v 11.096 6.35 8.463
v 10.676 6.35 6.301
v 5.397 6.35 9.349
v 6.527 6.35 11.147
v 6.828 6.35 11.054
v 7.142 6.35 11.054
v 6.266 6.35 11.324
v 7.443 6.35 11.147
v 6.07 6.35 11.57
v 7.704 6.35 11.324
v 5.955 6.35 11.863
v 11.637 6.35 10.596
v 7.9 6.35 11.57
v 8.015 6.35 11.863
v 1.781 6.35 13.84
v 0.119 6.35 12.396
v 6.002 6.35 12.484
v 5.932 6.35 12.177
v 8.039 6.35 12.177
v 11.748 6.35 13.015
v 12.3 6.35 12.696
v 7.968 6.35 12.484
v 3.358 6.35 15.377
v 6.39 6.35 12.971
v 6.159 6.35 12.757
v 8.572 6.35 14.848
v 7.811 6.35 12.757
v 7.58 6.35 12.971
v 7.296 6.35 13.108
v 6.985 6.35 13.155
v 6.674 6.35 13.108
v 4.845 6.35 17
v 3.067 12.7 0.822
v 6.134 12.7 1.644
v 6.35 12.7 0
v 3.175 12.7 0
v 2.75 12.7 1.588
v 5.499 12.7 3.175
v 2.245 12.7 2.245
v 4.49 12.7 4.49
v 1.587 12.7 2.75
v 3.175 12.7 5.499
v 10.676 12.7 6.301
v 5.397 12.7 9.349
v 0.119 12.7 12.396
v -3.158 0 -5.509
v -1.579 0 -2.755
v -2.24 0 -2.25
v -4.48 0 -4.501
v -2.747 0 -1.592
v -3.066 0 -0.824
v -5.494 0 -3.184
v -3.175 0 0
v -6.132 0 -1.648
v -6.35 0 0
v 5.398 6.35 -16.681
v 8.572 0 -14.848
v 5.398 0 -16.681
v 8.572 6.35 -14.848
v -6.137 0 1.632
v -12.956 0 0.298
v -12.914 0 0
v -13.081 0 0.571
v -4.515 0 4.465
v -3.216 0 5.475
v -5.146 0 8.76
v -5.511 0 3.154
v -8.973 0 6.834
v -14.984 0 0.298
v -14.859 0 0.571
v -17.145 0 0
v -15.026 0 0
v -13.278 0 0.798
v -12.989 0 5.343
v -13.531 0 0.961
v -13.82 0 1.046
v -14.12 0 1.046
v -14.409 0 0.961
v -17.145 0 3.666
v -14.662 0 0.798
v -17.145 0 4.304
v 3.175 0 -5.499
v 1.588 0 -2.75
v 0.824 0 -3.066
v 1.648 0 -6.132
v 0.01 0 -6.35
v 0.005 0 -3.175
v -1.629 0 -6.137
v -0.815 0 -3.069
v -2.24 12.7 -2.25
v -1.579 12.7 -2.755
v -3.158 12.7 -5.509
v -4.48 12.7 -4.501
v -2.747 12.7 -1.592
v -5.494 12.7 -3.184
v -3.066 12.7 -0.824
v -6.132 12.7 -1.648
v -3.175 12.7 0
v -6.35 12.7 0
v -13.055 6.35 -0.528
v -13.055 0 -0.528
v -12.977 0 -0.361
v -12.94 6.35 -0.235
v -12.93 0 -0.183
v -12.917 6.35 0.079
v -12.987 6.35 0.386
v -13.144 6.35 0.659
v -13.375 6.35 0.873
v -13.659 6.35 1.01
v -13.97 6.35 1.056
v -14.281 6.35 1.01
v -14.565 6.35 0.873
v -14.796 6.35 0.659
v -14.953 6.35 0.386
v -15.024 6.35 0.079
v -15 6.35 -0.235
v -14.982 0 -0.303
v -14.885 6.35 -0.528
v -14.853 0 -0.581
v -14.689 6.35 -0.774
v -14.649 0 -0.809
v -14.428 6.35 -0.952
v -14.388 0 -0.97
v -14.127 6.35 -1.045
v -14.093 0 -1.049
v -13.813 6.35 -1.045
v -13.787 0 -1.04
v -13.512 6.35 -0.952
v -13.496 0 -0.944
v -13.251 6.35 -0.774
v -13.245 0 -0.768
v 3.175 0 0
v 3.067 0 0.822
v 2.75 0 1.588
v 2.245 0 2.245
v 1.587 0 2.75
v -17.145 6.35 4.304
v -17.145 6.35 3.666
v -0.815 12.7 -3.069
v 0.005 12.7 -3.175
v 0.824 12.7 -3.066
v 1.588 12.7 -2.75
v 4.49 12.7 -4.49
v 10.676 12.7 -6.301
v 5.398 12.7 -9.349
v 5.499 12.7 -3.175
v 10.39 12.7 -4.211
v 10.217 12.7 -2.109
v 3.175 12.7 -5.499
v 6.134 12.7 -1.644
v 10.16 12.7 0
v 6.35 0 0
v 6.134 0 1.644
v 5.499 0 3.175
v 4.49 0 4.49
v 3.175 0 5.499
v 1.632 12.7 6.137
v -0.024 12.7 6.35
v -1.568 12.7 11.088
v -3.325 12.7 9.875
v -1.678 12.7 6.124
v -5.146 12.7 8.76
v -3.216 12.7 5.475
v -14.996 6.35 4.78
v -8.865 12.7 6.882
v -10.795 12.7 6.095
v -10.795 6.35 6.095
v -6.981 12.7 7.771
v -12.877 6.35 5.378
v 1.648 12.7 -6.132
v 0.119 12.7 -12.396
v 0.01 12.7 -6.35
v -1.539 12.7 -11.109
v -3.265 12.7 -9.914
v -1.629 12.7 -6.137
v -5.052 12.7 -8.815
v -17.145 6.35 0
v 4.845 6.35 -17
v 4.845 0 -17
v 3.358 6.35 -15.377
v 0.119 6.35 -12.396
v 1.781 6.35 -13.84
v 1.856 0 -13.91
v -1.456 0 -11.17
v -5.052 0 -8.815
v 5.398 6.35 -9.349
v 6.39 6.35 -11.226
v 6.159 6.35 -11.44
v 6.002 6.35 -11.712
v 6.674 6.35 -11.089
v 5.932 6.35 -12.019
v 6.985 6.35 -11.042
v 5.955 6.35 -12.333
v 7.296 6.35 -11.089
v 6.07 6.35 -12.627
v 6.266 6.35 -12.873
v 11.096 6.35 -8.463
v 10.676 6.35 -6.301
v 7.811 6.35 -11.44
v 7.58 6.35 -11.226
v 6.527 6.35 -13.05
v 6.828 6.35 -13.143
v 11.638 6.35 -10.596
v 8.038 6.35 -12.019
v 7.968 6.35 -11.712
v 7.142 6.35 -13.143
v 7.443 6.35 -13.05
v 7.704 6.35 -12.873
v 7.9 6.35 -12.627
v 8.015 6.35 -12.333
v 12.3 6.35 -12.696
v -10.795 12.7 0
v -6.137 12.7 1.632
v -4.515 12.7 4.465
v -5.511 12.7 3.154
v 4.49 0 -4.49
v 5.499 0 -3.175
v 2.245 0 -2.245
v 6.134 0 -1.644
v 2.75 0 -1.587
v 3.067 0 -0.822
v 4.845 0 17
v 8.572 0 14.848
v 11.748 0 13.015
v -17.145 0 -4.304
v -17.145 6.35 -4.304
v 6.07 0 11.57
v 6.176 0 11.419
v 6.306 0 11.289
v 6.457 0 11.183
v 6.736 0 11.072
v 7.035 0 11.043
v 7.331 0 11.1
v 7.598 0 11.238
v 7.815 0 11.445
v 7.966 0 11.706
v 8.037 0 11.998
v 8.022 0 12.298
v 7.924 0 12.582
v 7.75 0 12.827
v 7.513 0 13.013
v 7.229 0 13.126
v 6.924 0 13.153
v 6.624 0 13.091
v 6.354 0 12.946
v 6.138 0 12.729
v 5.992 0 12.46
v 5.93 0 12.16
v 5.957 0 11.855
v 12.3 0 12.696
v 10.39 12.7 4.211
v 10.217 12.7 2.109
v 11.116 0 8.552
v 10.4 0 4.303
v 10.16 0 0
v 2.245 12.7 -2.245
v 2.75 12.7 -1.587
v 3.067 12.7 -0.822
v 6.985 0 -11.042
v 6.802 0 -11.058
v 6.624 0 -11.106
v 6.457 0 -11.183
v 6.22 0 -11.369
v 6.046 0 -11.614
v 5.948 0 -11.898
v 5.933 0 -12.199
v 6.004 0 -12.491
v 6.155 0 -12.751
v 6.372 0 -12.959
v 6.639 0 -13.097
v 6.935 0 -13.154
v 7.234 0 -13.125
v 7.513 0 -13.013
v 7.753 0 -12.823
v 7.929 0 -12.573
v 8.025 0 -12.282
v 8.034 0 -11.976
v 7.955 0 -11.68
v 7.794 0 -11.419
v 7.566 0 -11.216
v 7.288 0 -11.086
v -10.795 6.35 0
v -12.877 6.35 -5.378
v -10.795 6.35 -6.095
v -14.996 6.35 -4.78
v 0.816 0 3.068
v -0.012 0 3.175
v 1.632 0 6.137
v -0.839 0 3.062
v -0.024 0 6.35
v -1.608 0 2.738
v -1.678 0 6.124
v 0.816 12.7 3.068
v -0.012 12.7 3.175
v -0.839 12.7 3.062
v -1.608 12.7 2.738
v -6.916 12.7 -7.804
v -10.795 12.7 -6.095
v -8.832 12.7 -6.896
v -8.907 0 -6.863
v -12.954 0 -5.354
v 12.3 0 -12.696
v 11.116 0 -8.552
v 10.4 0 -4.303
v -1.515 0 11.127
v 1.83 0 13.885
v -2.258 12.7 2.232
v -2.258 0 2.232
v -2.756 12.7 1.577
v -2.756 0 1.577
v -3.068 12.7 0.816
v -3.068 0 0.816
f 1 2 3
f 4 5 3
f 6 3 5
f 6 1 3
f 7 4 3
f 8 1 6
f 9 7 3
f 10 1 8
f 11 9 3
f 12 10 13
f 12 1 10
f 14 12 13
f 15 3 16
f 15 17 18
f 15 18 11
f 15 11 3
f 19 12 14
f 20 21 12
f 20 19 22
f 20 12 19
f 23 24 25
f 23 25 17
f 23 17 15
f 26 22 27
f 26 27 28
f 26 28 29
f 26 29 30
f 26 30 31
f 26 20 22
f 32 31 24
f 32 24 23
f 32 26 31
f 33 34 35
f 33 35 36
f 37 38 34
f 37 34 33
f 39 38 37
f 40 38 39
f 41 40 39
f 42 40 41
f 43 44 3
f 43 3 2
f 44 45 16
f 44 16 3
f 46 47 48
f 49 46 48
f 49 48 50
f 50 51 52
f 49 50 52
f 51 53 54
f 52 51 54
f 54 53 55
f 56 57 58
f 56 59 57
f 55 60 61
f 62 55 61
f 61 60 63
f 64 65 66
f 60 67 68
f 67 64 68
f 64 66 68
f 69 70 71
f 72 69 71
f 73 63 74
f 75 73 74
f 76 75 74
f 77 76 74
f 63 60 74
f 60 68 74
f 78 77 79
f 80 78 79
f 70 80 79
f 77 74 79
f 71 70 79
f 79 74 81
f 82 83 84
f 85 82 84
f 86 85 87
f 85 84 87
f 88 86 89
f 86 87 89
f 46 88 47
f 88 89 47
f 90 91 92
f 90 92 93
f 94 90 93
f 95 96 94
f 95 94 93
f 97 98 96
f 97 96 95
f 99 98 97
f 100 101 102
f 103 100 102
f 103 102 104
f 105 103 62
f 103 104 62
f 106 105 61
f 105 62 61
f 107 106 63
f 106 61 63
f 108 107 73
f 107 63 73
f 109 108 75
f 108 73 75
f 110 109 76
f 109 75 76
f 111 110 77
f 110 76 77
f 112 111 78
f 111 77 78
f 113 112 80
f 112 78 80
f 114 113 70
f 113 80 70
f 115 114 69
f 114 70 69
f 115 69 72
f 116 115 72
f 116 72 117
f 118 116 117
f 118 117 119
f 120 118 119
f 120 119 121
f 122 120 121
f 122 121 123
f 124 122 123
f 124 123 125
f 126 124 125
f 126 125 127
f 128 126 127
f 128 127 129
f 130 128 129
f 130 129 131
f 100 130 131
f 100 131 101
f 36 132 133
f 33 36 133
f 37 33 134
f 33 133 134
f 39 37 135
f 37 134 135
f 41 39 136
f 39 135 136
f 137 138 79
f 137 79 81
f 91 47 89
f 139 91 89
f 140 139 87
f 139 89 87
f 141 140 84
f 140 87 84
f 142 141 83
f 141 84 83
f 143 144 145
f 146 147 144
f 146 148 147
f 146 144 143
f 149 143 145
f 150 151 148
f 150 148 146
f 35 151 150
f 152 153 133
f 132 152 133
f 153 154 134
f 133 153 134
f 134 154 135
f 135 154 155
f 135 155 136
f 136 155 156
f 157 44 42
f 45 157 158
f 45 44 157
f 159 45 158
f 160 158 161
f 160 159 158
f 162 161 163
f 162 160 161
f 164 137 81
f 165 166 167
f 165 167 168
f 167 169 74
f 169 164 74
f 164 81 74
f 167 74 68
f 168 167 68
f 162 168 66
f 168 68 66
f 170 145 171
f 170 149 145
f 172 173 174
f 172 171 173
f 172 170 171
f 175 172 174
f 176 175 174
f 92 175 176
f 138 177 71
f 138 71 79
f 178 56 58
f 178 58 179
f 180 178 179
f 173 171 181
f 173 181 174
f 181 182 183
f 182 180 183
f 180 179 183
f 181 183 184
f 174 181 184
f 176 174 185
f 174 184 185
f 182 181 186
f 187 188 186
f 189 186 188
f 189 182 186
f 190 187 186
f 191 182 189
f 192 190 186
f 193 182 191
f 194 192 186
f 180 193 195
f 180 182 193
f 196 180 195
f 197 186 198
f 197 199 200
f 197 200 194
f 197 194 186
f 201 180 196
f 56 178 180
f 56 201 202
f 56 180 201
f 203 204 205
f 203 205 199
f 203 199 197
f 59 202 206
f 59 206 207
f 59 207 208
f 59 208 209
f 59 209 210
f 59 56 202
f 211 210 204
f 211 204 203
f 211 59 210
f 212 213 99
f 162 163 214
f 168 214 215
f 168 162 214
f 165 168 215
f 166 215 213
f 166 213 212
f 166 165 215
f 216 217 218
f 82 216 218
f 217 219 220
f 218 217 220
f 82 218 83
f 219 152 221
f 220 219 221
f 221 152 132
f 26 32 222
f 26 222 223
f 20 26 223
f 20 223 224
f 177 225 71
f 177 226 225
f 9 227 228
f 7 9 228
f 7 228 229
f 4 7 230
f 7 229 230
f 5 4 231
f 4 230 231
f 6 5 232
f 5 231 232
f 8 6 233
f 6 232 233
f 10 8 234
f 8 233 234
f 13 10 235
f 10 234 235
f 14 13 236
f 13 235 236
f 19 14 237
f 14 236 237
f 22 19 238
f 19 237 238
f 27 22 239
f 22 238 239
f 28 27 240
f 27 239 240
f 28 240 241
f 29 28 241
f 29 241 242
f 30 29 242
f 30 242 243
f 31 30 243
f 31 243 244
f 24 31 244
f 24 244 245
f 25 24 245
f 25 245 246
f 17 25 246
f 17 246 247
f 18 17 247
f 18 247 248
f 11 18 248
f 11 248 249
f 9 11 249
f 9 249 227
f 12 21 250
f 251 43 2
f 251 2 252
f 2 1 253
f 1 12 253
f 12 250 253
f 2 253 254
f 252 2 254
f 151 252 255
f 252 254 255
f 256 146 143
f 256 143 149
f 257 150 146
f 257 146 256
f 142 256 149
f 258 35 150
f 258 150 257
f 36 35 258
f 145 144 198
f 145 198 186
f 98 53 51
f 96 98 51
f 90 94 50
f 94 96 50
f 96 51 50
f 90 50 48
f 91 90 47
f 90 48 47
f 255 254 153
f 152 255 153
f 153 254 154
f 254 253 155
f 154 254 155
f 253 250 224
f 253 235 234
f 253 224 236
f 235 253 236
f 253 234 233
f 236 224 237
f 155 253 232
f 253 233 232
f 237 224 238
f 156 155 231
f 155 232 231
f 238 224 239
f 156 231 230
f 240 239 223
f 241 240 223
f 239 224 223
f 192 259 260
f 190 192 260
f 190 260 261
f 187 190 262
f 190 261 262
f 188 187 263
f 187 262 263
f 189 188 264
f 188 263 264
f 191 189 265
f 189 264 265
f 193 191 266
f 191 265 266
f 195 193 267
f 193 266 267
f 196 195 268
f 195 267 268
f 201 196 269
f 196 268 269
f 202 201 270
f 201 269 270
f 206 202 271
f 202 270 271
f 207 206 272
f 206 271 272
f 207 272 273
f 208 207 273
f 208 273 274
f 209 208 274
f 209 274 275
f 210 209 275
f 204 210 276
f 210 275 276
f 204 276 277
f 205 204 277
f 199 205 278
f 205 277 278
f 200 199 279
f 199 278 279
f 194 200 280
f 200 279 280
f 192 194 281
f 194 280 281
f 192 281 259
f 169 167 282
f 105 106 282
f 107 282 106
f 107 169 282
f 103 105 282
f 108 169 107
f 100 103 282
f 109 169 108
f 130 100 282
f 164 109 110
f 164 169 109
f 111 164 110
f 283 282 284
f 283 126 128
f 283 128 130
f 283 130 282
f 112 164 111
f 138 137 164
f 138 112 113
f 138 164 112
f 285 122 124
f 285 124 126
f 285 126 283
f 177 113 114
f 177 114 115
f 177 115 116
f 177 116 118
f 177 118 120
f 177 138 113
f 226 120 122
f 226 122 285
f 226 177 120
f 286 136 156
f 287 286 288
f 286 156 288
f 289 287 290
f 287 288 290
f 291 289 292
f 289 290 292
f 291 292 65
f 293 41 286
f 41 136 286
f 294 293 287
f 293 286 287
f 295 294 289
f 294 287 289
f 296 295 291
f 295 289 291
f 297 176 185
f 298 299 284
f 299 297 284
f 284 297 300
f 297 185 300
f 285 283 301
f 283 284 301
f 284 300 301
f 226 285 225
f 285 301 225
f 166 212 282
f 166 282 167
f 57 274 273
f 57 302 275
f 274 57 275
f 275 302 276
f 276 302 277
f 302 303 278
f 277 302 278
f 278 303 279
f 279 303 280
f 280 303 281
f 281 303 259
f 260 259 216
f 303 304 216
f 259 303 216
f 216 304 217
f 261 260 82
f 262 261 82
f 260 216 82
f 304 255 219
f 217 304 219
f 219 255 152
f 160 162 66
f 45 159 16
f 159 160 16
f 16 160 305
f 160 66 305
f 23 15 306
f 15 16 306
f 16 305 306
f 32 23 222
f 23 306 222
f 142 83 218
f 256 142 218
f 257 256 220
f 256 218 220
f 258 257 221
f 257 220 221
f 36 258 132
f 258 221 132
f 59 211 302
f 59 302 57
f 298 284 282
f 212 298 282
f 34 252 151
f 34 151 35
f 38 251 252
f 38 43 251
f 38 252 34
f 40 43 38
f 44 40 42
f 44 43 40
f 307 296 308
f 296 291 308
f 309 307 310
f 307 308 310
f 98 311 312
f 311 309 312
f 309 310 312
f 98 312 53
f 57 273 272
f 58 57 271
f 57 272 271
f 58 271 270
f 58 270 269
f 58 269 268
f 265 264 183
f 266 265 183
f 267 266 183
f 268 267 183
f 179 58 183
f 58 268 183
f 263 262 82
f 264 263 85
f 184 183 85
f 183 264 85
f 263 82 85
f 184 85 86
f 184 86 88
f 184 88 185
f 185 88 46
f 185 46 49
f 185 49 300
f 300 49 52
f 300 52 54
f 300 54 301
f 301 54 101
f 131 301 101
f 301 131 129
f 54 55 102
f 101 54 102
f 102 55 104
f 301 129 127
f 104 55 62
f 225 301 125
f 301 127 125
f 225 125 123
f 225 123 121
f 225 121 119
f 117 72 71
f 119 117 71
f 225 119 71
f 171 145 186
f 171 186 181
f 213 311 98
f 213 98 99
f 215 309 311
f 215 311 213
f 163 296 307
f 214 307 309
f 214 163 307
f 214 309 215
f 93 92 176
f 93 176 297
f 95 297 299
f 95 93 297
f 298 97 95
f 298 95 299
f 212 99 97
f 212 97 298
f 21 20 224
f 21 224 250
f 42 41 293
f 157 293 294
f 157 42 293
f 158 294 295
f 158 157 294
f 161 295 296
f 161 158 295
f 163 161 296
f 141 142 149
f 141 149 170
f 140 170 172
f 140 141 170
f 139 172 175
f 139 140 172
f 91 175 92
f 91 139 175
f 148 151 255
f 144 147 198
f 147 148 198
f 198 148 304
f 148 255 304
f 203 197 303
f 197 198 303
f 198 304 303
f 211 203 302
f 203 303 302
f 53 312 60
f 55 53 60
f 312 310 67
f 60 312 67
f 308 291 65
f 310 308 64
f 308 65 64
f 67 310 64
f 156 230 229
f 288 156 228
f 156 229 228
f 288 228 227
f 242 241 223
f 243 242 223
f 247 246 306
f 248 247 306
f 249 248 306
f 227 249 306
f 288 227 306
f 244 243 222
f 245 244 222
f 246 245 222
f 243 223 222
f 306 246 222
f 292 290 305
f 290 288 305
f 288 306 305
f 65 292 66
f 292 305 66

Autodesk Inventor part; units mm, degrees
ref_plane "YZ Plane" through (0, 0, 0) normal (1, 0, 0) x (0, 1, 0)
ref_plane "XZ Plane" through (0, 0, 0) normal (0, 1, 0) x (-1, 0, 0)
ref_plane "XY Plane" through (0, 0, 0) normal (0, 0, 1) x (1, 0, 0)
sketch "Sketch1" plane through (0, 0, 0) normal (0, 1, 0) x (-1, 0, 0)
  line L0 (0, 0) -> (28.575, 0)
  line L1 (28.575, 0) -> (0, 0)
  line L2 (0, 0) -> (-14.2875, -24.7467)
  line L3 (0, 0) -> (28.575, 0) construction
  line L4 (0, 0) -> (-14.2875, 24.7467)
  line L5 (0, 0) -> (28.575, 0) construction
  circle A0 centre (28.575, 0) radius 2.54
  circle A1 centre (-14.2875, -24.7467) radius 2.54
  circle A2 centre (-14.2875, 24.7467) radius 2.54
  circle A3 centre (0, 0) radius 3.175
  circle A4 centre (0, 0) radius 6.35
  line L6 (-1.5875, -2.7496) -> (0, 0)
  line L7 (0, 0) -> (-6.35, 0)
  circle A5 centre (-14.2875, 24.7467) radius 3.81
  circle A6 centre (28.575, 0) radius 3.81
  circle A7 centre (-14.2875, -24.7467) radius 3.81
  line L8 (30.6811, 3.175) -> (-12.1814, 27.9217)
  line L9 (28.2054, -3.792) -> (-10.8187, -26.3226)
  line L10 (-18.0975, 24.7467) -> (-18.0975, -24.7467)
  line L11 (0, 0) -> (5.0525, -8.8146)
  line L12 (0, 0) -> (5.1463, 8.7602)
  line L13 (0, 0) -> (-10.16, 0)
  arc A8 (28.2054, -3.792) -> (-10.8187, -26.3226) centre (24.4473, -42.344) ccw
  arc A9 (-10.8187, 26.3226) -> (28.2054, 3.792) centre (24.4473, 42.344) ccw
  arc A10 (-17.3867, -22.5305) -> (-17.3867, 22.5305) centre (-48.8947, 0) ccw
  point P0 (5.1074, 8.7829)
  point P1 (-10.16, 0.0317)
  point P2 (30.2716, 3.4114)
  point P3 (28.2054, 3.792)
  point P4 (-10.8187, 26.3226)
  point P5 (-17.3867, 22.5305)
  point P6 (-17.3867, -22.5305)
  dimension "d9" = 6.35
  dimension "d41" = 12.7
  dimension "d0" = 28.575
  dimension "d1" = 28.575
  dimension "d2" = 120
  dimension "d3" = 28.575
  dimension "d4" = 120
  dimension "d5" = 5.08
  dimension "d6" = 5.08
  dimension "d7" = 5.08
  dimension "d42" = 7.62
  dimension "d43" = 7.62
  dimension "d44" = 7.62
  dimension "d47" = 10.16
  dimension "d48" = 10.16
  dimension "d49" = 10.16
  dimension "d52" = 360
extrude "Extrusion4" add sketch "Sketch1" along normal blind 12.7 contours A3 L12 A4 L0 | L0 A4 L11 A3 | A3 L11 A4 L2 | L2 A4 L7 A3 | A3 L7 A4 L4 | L4 A4 L12 A3 | A4 L12 A9 A6 L0 | L0 A6 A8 L11 A4 | A4 L11 A8 A7 L2 | L2 A7 A10 L13 A4 | A4 L13 A10 A5 L4 | L4 A5 A9 L12 A4 | A6 L8 | A7 | A5 picked at (31.8987, 0.5122)
sketch "Sketch19" plane through (0, 12.7, 0) normal (0, 1, 0) x (1, 0, 0)
  arc A0 (17.3867, 22.5305) -> (10.8187, 26.3226) centre (14.2875, 24.7467) ccw projected
  line L0 (5.3975, 9.3487) -> (0.1191, 12.3962) projected
  arc A1 (-28.2054, 3.792) -> (10.8187, 26.3226) centre (-24.4473, 42.344) ccw projected
  arc A2 (-28.2054, 3.792) -> (-30.6811, -3.175) centre (-28.575, 0) ccw projected
  line L1 (-30.6811, -3.175) -> (-30.2716, -3.4114) projected
  arc A3 (-30.2716, -3.4114) -> (-28.2054, -3.792) centre (-28.575, 0) ccw projected
  arc A4 (10.8187, -26.3226) -> (-28.2054, -3.792) centre (-24.4473, -42.344) ccw projected
  arc A5 (10.8187, -26.3226) -> (17.3867, -22.5305) centre (14.2875, -24.7467) ccw projected
  arc A6 (17.3867, 22.5305) -> (17.3867, -22.5305) centre (48.8947, 0) ccw projected
  arc A7 (17.3867, 22.5305) -> (10.8187, 26.3226) centre (14.2875, 24.7467) ccw projected
  circle A8 centre (-28.575, 0) radius 2.54 projected
  circle A9 centre (0, 0) radius 3.175 projected
  circle A10 centre (14.2875, -24.7467) radius 2.54 projected
  circle A11 centre (14.2875, 24.7467) radius 2.54 projected
  line L2 (10.6759, 6.3013) -> (5.3975, 9.3487) projected
  arc A12 (-28.2054, 3.792) -> (10.8187, 26.3226) centre (-24.4473, 42.344) ccw projected
  point P0 (17.3867, 22.5305)
  point P1 (10.8187, 26.3226)
  point P2 (0.1191, 12.3962)
extrude "Extrusion9" cut sketch "Sketch19" against normal blind 6.35 contours A6 L2 L0 A1 A0
sketch "Sketch20" plane through (0, 6.35, 0) normal (0, 1, 0) x (1, 0, 0)
  line L0 (0, 0) -> (5.3975, 9.3487)
  line L1 (10.6759, 6.3013) -> (0.1191, 12.3962) projected
  line L2 (5.3975, 9.3487) -> (8.5725, 14.848)
  line L3 (8.5725, 14.848) -> (5.3975, 16.6811)
  line L4 (5.3975, 16.6811) -> (8.5725, 14.848)
  arc A0 (17.3867, 22.5305) -> (17.3867, -22.5305) centre (48.8947, 0) ccw projected
  line L5 (12.2997, 12.6961) -> (8.5725, 14.848)
  arc A1 (0.1191, 12.3962) -> (10.8187, 26.3226) centre (-24.4473, 42.344) ccw projected
  arc A2 (17.3867, 22.5305) -> (10.8187, 26.3226) centre (14.2875, 24.7467) ccw projected
  line L6 (8.5725, 14.848) -> (4.3283, 17.2984)
  point P0 (4.8453, 16.9999)
  dimension "d113" = 6.35
extrude "Extrusion10" cut sketch "Sketch20" against normal blind 6.35 contours L5 L3 L6 A1 A2 A0
pattern_circular "Circular Pattern2" count 3 over 360 about axis through (0, 0, 0) along (0, 1, 0) of "Extrusion9", "Extrusion10"
sketch "Sketch21" plane through (0, 12.7, 0) normal (0, 1, 0) x (1, 0, 0)
  point P0 (0, 0)
sketch "Sketch22" plane through (0, 6.35, 0) normal (0, 1, 0) x (1, 0, 0)
  line L0 (0, 0) -> (8.5725, 14.848)
  line L1 (4.8453, 16.9999) -> (12.2997, 12.6961) projected
  line L2 (10.6759, 6.3013) -> (0.1191, 12.3962) projected
  line L3 (5.3975, 9.3487) -> (8.5725, 14.848)
  line L4 (5.3975, 9.3487) -> (6.985, 12.0984)
  arc A0 (0.1191, 12.3962) -> (4.8453, 16.9999) centre (-24.4473, 42.344) ccw projected
  line L5 (2.6088, 14.625) -> (6.985, 12.0984)
  line L6 (6.985, 12.0984) -> (11.3612, 9.5718)
  arc A1 (12.2997, 12.6961) -> (12.2997, -12.6961) centre (48.8947, 0) ccw projected
hole "Hole8" at (6.985, 6.35, -12.0984) direction (0, -1, 0) diameter 2.1129 depth 7.7978 thread size "M2.6x0.45" class "6H" standard "ISO Metric profile"
pattern_circular "Circular Pattern3" count 3 over 360 about axis through (0, 0, 0) along (0, 1, 0) of "Hole8"
properties part number "stability copy"
